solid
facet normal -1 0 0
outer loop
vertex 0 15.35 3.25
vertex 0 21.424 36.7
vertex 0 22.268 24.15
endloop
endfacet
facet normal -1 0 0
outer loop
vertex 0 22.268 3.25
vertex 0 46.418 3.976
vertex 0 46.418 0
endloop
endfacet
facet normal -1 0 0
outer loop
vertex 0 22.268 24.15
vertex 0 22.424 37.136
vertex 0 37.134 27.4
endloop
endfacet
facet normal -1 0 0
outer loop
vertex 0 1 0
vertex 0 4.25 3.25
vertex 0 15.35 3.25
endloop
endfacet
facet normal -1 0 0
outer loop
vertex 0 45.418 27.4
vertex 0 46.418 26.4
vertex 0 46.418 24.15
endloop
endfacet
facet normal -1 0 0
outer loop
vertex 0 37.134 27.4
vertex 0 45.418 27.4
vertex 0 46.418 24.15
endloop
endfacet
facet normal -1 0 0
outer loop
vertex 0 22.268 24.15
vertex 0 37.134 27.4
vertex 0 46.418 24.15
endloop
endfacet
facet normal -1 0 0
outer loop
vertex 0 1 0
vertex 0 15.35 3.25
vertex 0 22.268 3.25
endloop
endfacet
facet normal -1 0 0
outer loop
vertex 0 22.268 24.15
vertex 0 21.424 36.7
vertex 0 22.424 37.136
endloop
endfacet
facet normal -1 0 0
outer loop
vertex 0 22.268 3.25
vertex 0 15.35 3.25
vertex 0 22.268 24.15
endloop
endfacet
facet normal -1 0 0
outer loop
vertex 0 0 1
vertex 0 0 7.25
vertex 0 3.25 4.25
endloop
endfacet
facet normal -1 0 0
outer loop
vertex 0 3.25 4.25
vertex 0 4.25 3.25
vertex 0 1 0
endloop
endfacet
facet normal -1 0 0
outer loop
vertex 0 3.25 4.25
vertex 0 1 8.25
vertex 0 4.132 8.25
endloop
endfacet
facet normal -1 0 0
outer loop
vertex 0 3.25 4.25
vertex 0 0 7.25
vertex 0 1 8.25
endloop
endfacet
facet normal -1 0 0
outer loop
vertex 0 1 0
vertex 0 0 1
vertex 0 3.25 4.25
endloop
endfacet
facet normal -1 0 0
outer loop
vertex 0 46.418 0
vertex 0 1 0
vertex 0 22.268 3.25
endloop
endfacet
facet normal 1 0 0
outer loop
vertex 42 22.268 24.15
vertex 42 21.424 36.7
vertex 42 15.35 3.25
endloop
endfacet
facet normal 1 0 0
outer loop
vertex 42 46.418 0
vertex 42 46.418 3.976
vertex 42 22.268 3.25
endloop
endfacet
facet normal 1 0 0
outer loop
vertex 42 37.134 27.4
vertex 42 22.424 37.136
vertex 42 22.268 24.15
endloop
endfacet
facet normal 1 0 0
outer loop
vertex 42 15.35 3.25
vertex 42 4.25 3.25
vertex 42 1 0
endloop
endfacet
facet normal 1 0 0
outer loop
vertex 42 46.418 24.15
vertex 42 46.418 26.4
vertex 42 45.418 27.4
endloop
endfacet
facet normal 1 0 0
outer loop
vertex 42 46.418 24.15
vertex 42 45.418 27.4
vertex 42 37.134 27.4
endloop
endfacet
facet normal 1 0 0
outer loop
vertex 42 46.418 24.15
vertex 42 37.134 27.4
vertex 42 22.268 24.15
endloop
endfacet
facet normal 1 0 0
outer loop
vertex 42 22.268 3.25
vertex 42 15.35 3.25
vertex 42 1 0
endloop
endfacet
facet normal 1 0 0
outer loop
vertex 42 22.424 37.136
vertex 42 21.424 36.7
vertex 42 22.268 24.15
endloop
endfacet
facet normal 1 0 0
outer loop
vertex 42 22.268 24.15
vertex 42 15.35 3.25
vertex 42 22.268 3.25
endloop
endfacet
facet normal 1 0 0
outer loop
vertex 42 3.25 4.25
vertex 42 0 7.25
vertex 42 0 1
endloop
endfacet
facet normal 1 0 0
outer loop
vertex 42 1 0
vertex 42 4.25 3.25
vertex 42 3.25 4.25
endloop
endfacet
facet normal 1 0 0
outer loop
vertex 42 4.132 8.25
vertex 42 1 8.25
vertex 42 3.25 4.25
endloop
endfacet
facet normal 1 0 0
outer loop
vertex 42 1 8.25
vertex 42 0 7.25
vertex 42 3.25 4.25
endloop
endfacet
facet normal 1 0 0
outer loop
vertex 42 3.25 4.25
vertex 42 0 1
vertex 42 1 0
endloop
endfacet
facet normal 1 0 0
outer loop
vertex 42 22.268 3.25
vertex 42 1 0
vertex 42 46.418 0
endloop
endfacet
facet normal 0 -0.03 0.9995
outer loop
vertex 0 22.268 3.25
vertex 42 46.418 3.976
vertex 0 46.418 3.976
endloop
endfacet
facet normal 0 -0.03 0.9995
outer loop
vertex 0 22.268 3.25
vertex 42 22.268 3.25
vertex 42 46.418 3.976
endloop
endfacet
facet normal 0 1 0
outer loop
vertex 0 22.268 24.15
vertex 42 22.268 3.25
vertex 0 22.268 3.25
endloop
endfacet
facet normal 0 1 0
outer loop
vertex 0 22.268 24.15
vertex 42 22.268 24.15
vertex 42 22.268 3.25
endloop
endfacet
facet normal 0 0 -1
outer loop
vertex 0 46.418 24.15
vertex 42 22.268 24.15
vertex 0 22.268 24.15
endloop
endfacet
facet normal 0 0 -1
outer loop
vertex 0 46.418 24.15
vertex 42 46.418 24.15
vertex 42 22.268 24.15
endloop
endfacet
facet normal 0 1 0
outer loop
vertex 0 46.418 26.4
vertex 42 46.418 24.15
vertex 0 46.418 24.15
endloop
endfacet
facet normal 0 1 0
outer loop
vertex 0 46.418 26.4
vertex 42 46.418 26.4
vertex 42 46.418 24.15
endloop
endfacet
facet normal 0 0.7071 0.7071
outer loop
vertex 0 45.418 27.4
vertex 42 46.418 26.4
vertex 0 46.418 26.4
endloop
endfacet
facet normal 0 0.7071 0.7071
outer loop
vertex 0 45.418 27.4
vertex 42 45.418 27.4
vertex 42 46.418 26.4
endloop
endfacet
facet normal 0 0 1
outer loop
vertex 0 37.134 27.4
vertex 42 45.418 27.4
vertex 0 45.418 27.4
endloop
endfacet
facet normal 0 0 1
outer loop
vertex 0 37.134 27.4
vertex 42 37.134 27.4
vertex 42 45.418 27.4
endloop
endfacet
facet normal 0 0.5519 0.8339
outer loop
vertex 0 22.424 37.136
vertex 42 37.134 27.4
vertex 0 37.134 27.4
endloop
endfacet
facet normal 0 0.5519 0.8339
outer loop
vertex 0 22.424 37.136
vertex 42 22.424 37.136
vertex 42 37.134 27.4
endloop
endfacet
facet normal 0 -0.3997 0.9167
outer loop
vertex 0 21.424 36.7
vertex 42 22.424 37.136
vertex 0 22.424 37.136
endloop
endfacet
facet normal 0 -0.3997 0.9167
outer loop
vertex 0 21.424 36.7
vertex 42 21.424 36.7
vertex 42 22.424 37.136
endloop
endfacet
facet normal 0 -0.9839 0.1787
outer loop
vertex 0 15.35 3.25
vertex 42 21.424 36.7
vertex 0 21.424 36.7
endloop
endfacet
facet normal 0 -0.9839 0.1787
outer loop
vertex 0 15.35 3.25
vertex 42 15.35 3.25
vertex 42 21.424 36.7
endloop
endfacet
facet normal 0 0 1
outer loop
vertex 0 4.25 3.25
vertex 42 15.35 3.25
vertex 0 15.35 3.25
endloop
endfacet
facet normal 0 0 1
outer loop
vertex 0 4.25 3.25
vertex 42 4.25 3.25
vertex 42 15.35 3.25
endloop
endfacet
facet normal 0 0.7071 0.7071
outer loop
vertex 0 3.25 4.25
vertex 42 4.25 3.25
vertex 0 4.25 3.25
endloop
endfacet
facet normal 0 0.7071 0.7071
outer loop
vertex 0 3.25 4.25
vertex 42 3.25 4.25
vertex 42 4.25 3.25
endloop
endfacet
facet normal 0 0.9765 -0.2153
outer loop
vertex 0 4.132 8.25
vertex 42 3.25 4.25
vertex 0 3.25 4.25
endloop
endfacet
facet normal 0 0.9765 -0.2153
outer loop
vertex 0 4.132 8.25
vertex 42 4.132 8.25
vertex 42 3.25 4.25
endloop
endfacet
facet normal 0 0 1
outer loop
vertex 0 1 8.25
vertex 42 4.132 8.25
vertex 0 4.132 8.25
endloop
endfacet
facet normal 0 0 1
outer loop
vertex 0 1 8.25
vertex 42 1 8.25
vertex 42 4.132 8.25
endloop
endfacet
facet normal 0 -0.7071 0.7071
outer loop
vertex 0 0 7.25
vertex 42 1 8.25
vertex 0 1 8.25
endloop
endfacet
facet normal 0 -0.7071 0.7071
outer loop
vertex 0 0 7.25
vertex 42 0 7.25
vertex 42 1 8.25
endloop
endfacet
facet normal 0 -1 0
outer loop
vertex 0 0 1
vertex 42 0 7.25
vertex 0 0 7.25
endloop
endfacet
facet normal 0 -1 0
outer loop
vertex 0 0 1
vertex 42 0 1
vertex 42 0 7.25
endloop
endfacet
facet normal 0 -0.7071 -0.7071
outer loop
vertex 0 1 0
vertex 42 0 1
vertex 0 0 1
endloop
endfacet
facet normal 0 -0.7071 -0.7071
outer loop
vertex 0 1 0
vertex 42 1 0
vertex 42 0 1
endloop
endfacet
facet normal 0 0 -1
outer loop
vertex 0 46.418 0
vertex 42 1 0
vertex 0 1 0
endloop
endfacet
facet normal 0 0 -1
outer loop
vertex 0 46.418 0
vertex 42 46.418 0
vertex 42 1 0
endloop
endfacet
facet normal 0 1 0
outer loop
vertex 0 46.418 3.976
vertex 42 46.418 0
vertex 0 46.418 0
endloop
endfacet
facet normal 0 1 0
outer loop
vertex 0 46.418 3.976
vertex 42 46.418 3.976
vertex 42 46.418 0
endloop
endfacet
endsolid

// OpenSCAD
// created by IndiePandaaaaa | Lukas

THICKNESS = 3.25;
TOLERANCE = 0.1;
CHAMFER = 1;
$fn = 75;

BOARD_THICKNESS = 20.8;
PHONE_THICKNESS = 12;
PHONE_ANGLE = 10;
HORIZONTAL = true; // for vertical mount set to false

// todo: add 3 degree angle to shrink the board for better stability when used
module phone_mount(board_thickness, phone_thickness, horizontal = true, phone_angle = 14, thickness = 3, chamfer = 1,
tolerance = 0.1, pinch_angle = 2) {
  rotate([90, 0, 90]) difference() {
    linear_extrude(42) {
      pinch_offset = tan(pinch_angle) * board_thickness;
      angle_depth = board_thickness / tan(90 - phone_angle) + thickness;
      depth = thickness * 2 + tolerance * 2 + phone_thickness + board_thickness + angle_depth;
      height = thickness * 2 + board_thickness * 1.5;
      middle_point = thickness + phone_thickness + tolerance + angle_depth;

      A = [0, chamfer];
      B = [chamfer, 0];
      Ch = [depth, 0];
      Dh = [depth, thickness + pinch_offset];
      Eh = [middle_point, thickness];
      Fh = [middle_point, thickness + board_thickness + tolerance];
      Gh = [depth, Fh[1]];
      Cv = [middle_point, 0];
      Dv = Fh;
      Ev = [depth - thickness, thickness + board_thickness + tolerance];
      Fv = [depth - thickness - pinch_offset, 0];
      Gv = [depth, 0];
      H = [depth, thickness * 2 + board_thickness + tolerance - chamfer];
      I = [H[0] - chamfer, H[1] + chamfer];
      J = [depth * 0.8, thickness * 2 + board_thickness + tolerance];
      L = [(thickness + phone_thickness + tolerance)
        + (height - thickness) / tan(90 - phone_angle), height - chamfer];
      K = [L[0] + chamfer, height - thickness * sin(phone_angle)];
      M = [(thickness + phone_thickness + tolerance), thickness];
      N = [thickness + chamfer, thickness];
      O = [thickness, thickness + chamfer];
      P = [thickness + tan(phone_angle) * 5, thickness + 5];
      Q = [chamfer, thickness + 5];
      R = [0, thickness + 5 - chamfer];

      if (horizontal) {
        polygon([A, B, Ch, Dh, Eh, Fh, Gh, H, I, J, K, L, M, N, O, P, Q, R]);
      } else {
        polygon([A, B, Cv, Dv, Ev, Fv, Gv, H, I, J, K, L, M, N, O, P, Q, R]);
      }
    }
  }
}

phone_mount(BOARD_THICKNESS, PHONE_THICKNESS, HORIZONTAL, PHONE_ANGLE, THICKNESS, CHAMFER, TOLERANCE);
